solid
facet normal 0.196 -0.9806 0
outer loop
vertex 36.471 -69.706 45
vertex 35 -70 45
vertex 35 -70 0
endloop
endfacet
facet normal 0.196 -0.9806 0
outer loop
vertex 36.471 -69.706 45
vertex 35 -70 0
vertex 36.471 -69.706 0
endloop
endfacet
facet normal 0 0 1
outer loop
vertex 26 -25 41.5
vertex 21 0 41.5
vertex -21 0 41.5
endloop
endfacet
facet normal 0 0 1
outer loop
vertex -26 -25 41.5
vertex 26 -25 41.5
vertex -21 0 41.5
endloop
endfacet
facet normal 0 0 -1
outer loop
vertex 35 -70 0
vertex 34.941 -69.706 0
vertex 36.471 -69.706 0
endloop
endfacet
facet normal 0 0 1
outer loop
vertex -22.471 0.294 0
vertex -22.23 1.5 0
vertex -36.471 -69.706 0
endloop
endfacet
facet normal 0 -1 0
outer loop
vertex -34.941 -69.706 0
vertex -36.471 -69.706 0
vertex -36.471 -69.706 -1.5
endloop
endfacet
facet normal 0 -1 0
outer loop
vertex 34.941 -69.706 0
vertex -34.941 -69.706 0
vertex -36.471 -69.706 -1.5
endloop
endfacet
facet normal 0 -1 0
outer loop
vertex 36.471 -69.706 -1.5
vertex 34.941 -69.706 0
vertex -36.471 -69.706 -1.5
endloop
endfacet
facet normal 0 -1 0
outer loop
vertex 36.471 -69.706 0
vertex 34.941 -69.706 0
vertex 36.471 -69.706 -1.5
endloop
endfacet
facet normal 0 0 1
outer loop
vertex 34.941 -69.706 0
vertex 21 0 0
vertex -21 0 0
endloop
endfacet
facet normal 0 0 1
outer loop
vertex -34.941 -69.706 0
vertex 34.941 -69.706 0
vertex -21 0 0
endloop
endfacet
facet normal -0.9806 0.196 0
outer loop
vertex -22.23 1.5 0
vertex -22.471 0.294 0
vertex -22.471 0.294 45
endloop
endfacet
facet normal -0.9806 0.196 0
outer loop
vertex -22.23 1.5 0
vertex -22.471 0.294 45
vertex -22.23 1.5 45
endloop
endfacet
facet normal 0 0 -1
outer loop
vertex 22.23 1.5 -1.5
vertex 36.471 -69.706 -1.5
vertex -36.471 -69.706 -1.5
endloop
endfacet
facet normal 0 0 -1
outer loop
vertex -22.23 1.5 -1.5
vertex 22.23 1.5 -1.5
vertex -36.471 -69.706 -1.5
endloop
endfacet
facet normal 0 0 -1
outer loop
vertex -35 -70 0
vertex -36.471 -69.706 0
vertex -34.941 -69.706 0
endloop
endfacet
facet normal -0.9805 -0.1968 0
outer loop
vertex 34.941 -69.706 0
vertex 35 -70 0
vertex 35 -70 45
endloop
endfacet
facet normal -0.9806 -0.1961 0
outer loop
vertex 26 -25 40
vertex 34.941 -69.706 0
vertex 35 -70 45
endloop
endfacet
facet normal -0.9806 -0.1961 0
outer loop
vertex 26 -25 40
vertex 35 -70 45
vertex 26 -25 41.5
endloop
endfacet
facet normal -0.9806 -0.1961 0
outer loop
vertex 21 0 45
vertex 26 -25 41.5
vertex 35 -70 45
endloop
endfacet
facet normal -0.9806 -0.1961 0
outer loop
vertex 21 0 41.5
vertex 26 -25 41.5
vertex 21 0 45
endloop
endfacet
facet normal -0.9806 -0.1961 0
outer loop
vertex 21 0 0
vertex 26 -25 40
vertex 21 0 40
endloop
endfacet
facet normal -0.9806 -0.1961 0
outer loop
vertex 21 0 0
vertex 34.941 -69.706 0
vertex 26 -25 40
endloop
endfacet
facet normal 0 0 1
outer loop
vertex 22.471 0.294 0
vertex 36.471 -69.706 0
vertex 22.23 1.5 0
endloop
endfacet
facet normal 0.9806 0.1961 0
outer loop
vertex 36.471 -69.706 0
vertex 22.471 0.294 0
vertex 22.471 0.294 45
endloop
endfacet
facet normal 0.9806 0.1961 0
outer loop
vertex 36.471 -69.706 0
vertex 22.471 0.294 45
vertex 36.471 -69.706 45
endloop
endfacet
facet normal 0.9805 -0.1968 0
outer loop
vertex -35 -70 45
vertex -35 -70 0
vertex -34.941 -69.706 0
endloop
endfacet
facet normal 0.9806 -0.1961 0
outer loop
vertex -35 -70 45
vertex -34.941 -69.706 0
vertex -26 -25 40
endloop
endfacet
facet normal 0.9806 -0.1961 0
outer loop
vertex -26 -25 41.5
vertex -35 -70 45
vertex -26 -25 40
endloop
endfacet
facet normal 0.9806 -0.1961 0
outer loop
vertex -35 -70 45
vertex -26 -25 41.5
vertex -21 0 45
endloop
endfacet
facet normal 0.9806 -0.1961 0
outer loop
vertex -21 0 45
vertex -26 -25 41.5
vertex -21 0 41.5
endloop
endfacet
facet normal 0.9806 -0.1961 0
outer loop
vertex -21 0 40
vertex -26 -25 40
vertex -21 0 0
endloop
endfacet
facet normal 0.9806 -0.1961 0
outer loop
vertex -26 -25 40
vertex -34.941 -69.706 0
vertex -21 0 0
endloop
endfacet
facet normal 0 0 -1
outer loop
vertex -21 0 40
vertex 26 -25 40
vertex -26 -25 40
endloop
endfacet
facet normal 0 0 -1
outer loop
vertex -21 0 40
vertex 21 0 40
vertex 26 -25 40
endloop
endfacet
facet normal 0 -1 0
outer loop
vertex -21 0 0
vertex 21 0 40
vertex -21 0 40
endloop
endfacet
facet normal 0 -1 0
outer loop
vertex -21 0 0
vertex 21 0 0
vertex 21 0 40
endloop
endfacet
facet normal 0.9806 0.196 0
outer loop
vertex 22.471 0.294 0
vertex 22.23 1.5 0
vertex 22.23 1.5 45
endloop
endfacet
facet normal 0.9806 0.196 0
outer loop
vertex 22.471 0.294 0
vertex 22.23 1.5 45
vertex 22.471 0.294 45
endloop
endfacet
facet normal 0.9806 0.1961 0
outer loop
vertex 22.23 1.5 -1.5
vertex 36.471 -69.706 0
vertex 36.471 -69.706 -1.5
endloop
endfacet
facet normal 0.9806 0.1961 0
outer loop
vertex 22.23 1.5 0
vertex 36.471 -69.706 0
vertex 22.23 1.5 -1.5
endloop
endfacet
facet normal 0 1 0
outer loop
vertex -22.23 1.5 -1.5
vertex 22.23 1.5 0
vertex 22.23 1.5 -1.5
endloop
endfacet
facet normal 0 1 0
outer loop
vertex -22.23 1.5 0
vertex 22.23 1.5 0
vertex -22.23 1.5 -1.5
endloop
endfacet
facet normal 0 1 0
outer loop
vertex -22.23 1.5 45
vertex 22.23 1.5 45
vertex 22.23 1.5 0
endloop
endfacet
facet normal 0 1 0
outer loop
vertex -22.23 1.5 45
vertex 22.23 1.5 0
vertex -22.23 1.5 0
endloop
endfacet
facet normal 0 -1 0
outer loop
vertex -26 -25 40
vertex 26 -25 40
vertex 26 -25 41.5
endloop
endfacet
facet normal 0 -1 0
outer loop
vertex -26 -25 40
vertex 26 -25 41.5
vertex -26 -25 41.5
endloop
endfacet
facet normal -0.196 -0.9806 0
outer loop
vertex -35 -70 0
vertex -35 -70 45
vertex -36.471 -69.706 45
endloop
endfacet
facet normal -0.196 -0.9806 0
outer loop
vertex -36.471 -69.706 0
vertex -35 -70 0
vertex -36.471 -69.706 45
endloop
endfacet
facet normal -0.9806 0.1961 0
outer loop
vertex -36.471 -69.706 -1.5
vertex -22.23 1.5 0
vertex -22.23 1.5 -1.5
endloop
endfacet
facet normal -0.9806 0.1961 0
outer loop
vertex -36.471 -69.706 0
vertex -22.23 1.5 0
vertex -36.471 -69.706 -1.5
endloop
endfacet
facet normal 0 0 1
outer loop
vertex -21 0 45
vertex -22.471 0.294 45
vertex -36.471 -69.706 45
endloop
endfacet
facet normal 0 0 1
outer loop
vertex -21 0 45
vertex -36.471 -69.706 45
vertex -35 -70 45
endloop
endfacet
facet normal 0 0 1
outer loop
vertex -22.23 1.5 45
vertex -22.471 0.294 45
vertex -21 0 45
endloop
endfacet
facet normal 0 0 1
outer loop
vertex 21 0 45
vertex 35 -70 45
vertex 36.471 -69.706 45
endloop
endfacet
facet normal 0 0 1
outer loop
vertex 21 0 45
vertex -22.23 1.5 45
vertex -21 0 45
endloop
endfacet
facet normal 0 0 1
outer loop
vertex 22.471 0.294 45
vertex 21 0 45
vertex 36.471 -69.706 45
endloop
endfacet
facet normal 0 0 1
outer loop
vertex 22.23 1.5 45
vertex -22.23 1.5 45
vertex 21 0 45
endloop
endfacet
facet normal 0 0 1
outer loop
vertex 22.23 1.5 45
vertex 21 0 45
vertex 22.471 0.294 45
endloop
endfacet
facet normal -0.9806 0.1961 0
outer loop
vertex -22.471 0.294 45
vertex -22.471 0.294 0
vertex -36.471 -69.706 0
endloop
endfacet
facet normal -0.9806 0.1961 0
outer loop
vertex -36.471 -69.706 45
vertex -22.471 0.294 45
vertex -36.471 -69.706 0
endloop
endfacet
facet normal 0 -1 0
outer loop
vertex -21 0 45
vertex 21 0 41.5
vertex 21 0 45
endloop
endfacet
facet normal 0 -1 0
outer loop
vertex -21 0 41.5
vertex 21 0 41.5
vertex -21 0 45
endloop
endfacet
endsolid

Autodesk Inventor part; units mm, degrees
ref_plane "YZ Plane" through (0, 0, 0) normal (1, 0, 0) x (0, 1, 0)
ref_plane "XZ Plane" through (0, 0, 0) normal (0, 1, 0) x (-1, 0, 0)
sketch "Sketch1" plane through (0, 0, 0) normal (0, 0, 1) x (1, 0, 0)
  point P0 (0, 0)
sketch "Sketch2" plane through (0, 0, 0) normal (0, 0, 1) x (1, 0, 0)
  line L0 (0, 0) -> (-21, 0)
  line L1 (0, 0) -> (21, 0)
  line L2 (21, -70) -> (-21, -70)
  line L3 (-21, -70) -> (-35, -70)
  line L4 (-35, -70) -> (-21, 0)
  line L5 (21, -70) -> (35, -70)
  line L6 (35, -70) -> (21, 0)
  line L7 (-35, -70) -> (-36.4709, -69.7058)
  line L8 (-22.4709, 0.2942) -> (-36.4709, -69.7058)
  line L9 (-22.4709, 0.2942) -> (-22.2297, 1.5)
  line L10 (35, -70) -> (36.4709, -69.7058)
  line L11 (22.4709, 0.2942) -> (36.4709, -69.7058)
  line L12 (-22.2297, 1.5) -> (22.2297, 1.5)
  line L13 (22.2297, 1.5) -> (22.4709, 0.2942)
  dimension "d3" = 21
  dimension "d4" = 21
  dimension "d5" = 70
  dimension "d6" = 14
  dimension "d7" = 14
  dimension "d24" = 1.5
  dimension "d25" = 1.5
  dimension "d26" = 1.5
extrude "Extrusion1" add sketch "Sketch2" along normal blind 45 contours L0 L4 L7 L8 L9 L12 L13 L11 L10 L6 L1
sketch "Sketch3" plane through (-21, 0, 0) normal (0, -1, 0) x (1, 0, 0)
  point P0 (21, 0)
sketch "Sketch5" plane through (-21, 0, 0) normal (0, -1, 0) x (1, 0, 0)
  line L0 (0, 45) -> (42, 45) projected
  line L1 (19.4909, 45) -> (14.4909, 45)
  line L2 (24.3761, 45) -> (24.3761, 40)
  line L3 (24.3761, 40) -> (42, 40)
  line L4 (42, 40) -> (0, 40)
  point P0 (21, 0)
  dimension "d16" = 5
  dimension "d17" = 5
sketch "Sketch6" plane through (-21, 0, 0) normal (0, -1, 0) x (1, 0, 0)
  point P0 (21, 0)
ref_plane "Work Plane6" through (21, 0, 40) normal (0, 0, -1) x (-1, 0, 0)
sketch "Sketch7" plane through (21, 0, 40) normal (0, 0, -1) x (-1, 0, 0)
  line L0 (42, 0) -> (0, 0) projected
  line L1 (0, 0) -> (42, 0)
  line L2 (42, -25) -> (47, -25)
  line L3 (56, -70) -> (42, 0) projected
  line L4 (42, -25) -> (-5, -25)
  line L5 (0, 0) -> (-14, -70) projected
  line L6 (0, 0) -> (-5, -25)
  line L7 (47, -25) -> (42, 0)
  line L8 (44.0495, 2.5) -> (58.4515, -69.5097) projected
  line L9 (47, -25) -> (42, -25)
  point P0 (21, 0)
  dimension "d19" = 25
extrude "Extrusion3" add sketch "Sketch7" against normal blind 1.5
sketch "Sketch8" plane through (0, 0, 0) normal (0, 0, -1) x (-1, 0, 0)
  point P0 (0, 0)
sketch "Sketch9" plane through (0, 0, 0) normal (0, 0, -1) x (-1, 0, 0)
  line L0 (-36.4709, -69.7058) -> (-22.2297, 1.5) projected
  line L1 (36.4709, -69.7058) -> (-36.4709, -69.7058)
  line L2 (-36.4709, -69.7058) -> (-22.2297, 1.5)
  line L3 (-22.2297, 1.5) -> (22.2297, 1.5)
  line L4 (22.2297, 1.5) -> (36.4709, -69.7058) projected
  line L5 (22.2297, 1.5) -> (36.4709, -69.7058)
  line L6 (22.2297, 1.5) -> (36.4709, -69.7058) projected
  line L7 (36.4709, -69.7058) -> (36.4709, -69.7058)
  point P0 (0, 0)
extrude "Extrusion4" add sketch "Sketch9" along normal blind 1.5
properties part number "Modulo"
